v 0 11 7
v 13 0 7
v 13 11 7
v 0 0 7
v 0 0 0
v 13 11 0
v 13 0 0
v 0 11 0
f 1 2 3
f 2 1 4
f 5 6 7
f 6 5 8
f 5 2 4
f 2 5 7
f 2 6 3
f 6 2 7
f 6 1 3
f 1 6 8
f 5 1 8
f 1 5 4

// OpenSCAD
// Generated by SolidPython 1.0.1 on 2020-07-29 00:46:55


cube(size = [13, 11, 7]);
/***********************************************
*********      SolidPython code:      **********
************************************************
 
# import packages: SolidPython
from solid import *
from solid.utils import *
from itertools import chain, combinations, permutations


class Resize:

    def __init__(self, scad_file):
        self.scad_file = scad_file
        #self.scad_file = import_scad(scad_file)
        # cone/cylinder param:
        self.r1 = 0
        self.r2 = 0
        self.h = 0
        # rectangular prism param:
        self.w = 0
        self.l = 0
        # ellipse param:
        self.r = 0

    # import OpenScad code (file name corresponds to shape)


    # classify shape + parameters
    def assign(self, param1, param2, param3):
        if self.scad_file == 'cone.scad':
            self.r1 = param1
            self.r2 = param2
            self.h = param3
        elif self.scad_file == 'cylinder.scad':
            self.r1 = param1
            self.r2 = param2
            self.h = param3
        elif self.scad_file == 'rectangularPrism.scad':
            self.h = param1
            self.l = param2
            self.w = param3
        else:
            self.r = param1
            self.h = param2

    # resize parameters
    def iterate(self):
        x = range(3, 20, 2)
        i = 1
        if self.scad_file == 'cone.scad':
            tempList = list(permutations(x, 2))
            for temp in tempList:
                param1 = temp[0]
                param2 = temp[1]
                filepath = 'produced_scad_files/' + 'cone' + str(param1) + '_' + str(param2) + '_' + '.scad'
                scad_render_to_file(cylinder(h=param1, r1=param2, r2=0), filepath)

        elif self.scad_file == 'cylinder.scad':
            tempList = list(permutations(x, 3))
            for temp in tempList:
                param1 = temp[0]
                param2 = temp[1]
                filepath = 'produced_scad_files/' + 'cylinder' + str(param1) + '_' + str(param2) + '_' + '.scad'
                scad_render_to_file(cylinder(h=param1, r1=param2, r2=param2), filepath)

        elif self.scad_file == 'rectangularPrism.scad':
            tempList = list(permutations(x, 3))
            for temp in tempList:
                param1 = temp[0]
                param2 = temp[1]
                param3 = temp[2]
                filepath = 'produced_scad_files/' + 'rectangularPrism' + str(param1) + '_' + str(param2) + '_' + str(
                    param3) + '.scad'
                scad_render_to_file(cube(size=(param1, param2, param3)), filepath)

        elif self.scad_file == 'ellipse.scad':
            tempList = list(permutations(x, 4))
            for temp in tempList:
                param1 = temp[0]
                param2 = temp[1]
                param3 = temp[2]
                param4 = temp[3]
                filepath = 'produced_scad_files/' + 'ellipse' + str(param1) + '_' + str(param2) + '_' + str(param3) + '_' + str(param4) + '.scad'
                scad_render_to_file(scale([param1, param2, param3])(sphere(r=param4)), filepath)

    def render_to_scadfile(self):
        scad_render_to_file(scad, 'example.scad') 
 
************************************************/
